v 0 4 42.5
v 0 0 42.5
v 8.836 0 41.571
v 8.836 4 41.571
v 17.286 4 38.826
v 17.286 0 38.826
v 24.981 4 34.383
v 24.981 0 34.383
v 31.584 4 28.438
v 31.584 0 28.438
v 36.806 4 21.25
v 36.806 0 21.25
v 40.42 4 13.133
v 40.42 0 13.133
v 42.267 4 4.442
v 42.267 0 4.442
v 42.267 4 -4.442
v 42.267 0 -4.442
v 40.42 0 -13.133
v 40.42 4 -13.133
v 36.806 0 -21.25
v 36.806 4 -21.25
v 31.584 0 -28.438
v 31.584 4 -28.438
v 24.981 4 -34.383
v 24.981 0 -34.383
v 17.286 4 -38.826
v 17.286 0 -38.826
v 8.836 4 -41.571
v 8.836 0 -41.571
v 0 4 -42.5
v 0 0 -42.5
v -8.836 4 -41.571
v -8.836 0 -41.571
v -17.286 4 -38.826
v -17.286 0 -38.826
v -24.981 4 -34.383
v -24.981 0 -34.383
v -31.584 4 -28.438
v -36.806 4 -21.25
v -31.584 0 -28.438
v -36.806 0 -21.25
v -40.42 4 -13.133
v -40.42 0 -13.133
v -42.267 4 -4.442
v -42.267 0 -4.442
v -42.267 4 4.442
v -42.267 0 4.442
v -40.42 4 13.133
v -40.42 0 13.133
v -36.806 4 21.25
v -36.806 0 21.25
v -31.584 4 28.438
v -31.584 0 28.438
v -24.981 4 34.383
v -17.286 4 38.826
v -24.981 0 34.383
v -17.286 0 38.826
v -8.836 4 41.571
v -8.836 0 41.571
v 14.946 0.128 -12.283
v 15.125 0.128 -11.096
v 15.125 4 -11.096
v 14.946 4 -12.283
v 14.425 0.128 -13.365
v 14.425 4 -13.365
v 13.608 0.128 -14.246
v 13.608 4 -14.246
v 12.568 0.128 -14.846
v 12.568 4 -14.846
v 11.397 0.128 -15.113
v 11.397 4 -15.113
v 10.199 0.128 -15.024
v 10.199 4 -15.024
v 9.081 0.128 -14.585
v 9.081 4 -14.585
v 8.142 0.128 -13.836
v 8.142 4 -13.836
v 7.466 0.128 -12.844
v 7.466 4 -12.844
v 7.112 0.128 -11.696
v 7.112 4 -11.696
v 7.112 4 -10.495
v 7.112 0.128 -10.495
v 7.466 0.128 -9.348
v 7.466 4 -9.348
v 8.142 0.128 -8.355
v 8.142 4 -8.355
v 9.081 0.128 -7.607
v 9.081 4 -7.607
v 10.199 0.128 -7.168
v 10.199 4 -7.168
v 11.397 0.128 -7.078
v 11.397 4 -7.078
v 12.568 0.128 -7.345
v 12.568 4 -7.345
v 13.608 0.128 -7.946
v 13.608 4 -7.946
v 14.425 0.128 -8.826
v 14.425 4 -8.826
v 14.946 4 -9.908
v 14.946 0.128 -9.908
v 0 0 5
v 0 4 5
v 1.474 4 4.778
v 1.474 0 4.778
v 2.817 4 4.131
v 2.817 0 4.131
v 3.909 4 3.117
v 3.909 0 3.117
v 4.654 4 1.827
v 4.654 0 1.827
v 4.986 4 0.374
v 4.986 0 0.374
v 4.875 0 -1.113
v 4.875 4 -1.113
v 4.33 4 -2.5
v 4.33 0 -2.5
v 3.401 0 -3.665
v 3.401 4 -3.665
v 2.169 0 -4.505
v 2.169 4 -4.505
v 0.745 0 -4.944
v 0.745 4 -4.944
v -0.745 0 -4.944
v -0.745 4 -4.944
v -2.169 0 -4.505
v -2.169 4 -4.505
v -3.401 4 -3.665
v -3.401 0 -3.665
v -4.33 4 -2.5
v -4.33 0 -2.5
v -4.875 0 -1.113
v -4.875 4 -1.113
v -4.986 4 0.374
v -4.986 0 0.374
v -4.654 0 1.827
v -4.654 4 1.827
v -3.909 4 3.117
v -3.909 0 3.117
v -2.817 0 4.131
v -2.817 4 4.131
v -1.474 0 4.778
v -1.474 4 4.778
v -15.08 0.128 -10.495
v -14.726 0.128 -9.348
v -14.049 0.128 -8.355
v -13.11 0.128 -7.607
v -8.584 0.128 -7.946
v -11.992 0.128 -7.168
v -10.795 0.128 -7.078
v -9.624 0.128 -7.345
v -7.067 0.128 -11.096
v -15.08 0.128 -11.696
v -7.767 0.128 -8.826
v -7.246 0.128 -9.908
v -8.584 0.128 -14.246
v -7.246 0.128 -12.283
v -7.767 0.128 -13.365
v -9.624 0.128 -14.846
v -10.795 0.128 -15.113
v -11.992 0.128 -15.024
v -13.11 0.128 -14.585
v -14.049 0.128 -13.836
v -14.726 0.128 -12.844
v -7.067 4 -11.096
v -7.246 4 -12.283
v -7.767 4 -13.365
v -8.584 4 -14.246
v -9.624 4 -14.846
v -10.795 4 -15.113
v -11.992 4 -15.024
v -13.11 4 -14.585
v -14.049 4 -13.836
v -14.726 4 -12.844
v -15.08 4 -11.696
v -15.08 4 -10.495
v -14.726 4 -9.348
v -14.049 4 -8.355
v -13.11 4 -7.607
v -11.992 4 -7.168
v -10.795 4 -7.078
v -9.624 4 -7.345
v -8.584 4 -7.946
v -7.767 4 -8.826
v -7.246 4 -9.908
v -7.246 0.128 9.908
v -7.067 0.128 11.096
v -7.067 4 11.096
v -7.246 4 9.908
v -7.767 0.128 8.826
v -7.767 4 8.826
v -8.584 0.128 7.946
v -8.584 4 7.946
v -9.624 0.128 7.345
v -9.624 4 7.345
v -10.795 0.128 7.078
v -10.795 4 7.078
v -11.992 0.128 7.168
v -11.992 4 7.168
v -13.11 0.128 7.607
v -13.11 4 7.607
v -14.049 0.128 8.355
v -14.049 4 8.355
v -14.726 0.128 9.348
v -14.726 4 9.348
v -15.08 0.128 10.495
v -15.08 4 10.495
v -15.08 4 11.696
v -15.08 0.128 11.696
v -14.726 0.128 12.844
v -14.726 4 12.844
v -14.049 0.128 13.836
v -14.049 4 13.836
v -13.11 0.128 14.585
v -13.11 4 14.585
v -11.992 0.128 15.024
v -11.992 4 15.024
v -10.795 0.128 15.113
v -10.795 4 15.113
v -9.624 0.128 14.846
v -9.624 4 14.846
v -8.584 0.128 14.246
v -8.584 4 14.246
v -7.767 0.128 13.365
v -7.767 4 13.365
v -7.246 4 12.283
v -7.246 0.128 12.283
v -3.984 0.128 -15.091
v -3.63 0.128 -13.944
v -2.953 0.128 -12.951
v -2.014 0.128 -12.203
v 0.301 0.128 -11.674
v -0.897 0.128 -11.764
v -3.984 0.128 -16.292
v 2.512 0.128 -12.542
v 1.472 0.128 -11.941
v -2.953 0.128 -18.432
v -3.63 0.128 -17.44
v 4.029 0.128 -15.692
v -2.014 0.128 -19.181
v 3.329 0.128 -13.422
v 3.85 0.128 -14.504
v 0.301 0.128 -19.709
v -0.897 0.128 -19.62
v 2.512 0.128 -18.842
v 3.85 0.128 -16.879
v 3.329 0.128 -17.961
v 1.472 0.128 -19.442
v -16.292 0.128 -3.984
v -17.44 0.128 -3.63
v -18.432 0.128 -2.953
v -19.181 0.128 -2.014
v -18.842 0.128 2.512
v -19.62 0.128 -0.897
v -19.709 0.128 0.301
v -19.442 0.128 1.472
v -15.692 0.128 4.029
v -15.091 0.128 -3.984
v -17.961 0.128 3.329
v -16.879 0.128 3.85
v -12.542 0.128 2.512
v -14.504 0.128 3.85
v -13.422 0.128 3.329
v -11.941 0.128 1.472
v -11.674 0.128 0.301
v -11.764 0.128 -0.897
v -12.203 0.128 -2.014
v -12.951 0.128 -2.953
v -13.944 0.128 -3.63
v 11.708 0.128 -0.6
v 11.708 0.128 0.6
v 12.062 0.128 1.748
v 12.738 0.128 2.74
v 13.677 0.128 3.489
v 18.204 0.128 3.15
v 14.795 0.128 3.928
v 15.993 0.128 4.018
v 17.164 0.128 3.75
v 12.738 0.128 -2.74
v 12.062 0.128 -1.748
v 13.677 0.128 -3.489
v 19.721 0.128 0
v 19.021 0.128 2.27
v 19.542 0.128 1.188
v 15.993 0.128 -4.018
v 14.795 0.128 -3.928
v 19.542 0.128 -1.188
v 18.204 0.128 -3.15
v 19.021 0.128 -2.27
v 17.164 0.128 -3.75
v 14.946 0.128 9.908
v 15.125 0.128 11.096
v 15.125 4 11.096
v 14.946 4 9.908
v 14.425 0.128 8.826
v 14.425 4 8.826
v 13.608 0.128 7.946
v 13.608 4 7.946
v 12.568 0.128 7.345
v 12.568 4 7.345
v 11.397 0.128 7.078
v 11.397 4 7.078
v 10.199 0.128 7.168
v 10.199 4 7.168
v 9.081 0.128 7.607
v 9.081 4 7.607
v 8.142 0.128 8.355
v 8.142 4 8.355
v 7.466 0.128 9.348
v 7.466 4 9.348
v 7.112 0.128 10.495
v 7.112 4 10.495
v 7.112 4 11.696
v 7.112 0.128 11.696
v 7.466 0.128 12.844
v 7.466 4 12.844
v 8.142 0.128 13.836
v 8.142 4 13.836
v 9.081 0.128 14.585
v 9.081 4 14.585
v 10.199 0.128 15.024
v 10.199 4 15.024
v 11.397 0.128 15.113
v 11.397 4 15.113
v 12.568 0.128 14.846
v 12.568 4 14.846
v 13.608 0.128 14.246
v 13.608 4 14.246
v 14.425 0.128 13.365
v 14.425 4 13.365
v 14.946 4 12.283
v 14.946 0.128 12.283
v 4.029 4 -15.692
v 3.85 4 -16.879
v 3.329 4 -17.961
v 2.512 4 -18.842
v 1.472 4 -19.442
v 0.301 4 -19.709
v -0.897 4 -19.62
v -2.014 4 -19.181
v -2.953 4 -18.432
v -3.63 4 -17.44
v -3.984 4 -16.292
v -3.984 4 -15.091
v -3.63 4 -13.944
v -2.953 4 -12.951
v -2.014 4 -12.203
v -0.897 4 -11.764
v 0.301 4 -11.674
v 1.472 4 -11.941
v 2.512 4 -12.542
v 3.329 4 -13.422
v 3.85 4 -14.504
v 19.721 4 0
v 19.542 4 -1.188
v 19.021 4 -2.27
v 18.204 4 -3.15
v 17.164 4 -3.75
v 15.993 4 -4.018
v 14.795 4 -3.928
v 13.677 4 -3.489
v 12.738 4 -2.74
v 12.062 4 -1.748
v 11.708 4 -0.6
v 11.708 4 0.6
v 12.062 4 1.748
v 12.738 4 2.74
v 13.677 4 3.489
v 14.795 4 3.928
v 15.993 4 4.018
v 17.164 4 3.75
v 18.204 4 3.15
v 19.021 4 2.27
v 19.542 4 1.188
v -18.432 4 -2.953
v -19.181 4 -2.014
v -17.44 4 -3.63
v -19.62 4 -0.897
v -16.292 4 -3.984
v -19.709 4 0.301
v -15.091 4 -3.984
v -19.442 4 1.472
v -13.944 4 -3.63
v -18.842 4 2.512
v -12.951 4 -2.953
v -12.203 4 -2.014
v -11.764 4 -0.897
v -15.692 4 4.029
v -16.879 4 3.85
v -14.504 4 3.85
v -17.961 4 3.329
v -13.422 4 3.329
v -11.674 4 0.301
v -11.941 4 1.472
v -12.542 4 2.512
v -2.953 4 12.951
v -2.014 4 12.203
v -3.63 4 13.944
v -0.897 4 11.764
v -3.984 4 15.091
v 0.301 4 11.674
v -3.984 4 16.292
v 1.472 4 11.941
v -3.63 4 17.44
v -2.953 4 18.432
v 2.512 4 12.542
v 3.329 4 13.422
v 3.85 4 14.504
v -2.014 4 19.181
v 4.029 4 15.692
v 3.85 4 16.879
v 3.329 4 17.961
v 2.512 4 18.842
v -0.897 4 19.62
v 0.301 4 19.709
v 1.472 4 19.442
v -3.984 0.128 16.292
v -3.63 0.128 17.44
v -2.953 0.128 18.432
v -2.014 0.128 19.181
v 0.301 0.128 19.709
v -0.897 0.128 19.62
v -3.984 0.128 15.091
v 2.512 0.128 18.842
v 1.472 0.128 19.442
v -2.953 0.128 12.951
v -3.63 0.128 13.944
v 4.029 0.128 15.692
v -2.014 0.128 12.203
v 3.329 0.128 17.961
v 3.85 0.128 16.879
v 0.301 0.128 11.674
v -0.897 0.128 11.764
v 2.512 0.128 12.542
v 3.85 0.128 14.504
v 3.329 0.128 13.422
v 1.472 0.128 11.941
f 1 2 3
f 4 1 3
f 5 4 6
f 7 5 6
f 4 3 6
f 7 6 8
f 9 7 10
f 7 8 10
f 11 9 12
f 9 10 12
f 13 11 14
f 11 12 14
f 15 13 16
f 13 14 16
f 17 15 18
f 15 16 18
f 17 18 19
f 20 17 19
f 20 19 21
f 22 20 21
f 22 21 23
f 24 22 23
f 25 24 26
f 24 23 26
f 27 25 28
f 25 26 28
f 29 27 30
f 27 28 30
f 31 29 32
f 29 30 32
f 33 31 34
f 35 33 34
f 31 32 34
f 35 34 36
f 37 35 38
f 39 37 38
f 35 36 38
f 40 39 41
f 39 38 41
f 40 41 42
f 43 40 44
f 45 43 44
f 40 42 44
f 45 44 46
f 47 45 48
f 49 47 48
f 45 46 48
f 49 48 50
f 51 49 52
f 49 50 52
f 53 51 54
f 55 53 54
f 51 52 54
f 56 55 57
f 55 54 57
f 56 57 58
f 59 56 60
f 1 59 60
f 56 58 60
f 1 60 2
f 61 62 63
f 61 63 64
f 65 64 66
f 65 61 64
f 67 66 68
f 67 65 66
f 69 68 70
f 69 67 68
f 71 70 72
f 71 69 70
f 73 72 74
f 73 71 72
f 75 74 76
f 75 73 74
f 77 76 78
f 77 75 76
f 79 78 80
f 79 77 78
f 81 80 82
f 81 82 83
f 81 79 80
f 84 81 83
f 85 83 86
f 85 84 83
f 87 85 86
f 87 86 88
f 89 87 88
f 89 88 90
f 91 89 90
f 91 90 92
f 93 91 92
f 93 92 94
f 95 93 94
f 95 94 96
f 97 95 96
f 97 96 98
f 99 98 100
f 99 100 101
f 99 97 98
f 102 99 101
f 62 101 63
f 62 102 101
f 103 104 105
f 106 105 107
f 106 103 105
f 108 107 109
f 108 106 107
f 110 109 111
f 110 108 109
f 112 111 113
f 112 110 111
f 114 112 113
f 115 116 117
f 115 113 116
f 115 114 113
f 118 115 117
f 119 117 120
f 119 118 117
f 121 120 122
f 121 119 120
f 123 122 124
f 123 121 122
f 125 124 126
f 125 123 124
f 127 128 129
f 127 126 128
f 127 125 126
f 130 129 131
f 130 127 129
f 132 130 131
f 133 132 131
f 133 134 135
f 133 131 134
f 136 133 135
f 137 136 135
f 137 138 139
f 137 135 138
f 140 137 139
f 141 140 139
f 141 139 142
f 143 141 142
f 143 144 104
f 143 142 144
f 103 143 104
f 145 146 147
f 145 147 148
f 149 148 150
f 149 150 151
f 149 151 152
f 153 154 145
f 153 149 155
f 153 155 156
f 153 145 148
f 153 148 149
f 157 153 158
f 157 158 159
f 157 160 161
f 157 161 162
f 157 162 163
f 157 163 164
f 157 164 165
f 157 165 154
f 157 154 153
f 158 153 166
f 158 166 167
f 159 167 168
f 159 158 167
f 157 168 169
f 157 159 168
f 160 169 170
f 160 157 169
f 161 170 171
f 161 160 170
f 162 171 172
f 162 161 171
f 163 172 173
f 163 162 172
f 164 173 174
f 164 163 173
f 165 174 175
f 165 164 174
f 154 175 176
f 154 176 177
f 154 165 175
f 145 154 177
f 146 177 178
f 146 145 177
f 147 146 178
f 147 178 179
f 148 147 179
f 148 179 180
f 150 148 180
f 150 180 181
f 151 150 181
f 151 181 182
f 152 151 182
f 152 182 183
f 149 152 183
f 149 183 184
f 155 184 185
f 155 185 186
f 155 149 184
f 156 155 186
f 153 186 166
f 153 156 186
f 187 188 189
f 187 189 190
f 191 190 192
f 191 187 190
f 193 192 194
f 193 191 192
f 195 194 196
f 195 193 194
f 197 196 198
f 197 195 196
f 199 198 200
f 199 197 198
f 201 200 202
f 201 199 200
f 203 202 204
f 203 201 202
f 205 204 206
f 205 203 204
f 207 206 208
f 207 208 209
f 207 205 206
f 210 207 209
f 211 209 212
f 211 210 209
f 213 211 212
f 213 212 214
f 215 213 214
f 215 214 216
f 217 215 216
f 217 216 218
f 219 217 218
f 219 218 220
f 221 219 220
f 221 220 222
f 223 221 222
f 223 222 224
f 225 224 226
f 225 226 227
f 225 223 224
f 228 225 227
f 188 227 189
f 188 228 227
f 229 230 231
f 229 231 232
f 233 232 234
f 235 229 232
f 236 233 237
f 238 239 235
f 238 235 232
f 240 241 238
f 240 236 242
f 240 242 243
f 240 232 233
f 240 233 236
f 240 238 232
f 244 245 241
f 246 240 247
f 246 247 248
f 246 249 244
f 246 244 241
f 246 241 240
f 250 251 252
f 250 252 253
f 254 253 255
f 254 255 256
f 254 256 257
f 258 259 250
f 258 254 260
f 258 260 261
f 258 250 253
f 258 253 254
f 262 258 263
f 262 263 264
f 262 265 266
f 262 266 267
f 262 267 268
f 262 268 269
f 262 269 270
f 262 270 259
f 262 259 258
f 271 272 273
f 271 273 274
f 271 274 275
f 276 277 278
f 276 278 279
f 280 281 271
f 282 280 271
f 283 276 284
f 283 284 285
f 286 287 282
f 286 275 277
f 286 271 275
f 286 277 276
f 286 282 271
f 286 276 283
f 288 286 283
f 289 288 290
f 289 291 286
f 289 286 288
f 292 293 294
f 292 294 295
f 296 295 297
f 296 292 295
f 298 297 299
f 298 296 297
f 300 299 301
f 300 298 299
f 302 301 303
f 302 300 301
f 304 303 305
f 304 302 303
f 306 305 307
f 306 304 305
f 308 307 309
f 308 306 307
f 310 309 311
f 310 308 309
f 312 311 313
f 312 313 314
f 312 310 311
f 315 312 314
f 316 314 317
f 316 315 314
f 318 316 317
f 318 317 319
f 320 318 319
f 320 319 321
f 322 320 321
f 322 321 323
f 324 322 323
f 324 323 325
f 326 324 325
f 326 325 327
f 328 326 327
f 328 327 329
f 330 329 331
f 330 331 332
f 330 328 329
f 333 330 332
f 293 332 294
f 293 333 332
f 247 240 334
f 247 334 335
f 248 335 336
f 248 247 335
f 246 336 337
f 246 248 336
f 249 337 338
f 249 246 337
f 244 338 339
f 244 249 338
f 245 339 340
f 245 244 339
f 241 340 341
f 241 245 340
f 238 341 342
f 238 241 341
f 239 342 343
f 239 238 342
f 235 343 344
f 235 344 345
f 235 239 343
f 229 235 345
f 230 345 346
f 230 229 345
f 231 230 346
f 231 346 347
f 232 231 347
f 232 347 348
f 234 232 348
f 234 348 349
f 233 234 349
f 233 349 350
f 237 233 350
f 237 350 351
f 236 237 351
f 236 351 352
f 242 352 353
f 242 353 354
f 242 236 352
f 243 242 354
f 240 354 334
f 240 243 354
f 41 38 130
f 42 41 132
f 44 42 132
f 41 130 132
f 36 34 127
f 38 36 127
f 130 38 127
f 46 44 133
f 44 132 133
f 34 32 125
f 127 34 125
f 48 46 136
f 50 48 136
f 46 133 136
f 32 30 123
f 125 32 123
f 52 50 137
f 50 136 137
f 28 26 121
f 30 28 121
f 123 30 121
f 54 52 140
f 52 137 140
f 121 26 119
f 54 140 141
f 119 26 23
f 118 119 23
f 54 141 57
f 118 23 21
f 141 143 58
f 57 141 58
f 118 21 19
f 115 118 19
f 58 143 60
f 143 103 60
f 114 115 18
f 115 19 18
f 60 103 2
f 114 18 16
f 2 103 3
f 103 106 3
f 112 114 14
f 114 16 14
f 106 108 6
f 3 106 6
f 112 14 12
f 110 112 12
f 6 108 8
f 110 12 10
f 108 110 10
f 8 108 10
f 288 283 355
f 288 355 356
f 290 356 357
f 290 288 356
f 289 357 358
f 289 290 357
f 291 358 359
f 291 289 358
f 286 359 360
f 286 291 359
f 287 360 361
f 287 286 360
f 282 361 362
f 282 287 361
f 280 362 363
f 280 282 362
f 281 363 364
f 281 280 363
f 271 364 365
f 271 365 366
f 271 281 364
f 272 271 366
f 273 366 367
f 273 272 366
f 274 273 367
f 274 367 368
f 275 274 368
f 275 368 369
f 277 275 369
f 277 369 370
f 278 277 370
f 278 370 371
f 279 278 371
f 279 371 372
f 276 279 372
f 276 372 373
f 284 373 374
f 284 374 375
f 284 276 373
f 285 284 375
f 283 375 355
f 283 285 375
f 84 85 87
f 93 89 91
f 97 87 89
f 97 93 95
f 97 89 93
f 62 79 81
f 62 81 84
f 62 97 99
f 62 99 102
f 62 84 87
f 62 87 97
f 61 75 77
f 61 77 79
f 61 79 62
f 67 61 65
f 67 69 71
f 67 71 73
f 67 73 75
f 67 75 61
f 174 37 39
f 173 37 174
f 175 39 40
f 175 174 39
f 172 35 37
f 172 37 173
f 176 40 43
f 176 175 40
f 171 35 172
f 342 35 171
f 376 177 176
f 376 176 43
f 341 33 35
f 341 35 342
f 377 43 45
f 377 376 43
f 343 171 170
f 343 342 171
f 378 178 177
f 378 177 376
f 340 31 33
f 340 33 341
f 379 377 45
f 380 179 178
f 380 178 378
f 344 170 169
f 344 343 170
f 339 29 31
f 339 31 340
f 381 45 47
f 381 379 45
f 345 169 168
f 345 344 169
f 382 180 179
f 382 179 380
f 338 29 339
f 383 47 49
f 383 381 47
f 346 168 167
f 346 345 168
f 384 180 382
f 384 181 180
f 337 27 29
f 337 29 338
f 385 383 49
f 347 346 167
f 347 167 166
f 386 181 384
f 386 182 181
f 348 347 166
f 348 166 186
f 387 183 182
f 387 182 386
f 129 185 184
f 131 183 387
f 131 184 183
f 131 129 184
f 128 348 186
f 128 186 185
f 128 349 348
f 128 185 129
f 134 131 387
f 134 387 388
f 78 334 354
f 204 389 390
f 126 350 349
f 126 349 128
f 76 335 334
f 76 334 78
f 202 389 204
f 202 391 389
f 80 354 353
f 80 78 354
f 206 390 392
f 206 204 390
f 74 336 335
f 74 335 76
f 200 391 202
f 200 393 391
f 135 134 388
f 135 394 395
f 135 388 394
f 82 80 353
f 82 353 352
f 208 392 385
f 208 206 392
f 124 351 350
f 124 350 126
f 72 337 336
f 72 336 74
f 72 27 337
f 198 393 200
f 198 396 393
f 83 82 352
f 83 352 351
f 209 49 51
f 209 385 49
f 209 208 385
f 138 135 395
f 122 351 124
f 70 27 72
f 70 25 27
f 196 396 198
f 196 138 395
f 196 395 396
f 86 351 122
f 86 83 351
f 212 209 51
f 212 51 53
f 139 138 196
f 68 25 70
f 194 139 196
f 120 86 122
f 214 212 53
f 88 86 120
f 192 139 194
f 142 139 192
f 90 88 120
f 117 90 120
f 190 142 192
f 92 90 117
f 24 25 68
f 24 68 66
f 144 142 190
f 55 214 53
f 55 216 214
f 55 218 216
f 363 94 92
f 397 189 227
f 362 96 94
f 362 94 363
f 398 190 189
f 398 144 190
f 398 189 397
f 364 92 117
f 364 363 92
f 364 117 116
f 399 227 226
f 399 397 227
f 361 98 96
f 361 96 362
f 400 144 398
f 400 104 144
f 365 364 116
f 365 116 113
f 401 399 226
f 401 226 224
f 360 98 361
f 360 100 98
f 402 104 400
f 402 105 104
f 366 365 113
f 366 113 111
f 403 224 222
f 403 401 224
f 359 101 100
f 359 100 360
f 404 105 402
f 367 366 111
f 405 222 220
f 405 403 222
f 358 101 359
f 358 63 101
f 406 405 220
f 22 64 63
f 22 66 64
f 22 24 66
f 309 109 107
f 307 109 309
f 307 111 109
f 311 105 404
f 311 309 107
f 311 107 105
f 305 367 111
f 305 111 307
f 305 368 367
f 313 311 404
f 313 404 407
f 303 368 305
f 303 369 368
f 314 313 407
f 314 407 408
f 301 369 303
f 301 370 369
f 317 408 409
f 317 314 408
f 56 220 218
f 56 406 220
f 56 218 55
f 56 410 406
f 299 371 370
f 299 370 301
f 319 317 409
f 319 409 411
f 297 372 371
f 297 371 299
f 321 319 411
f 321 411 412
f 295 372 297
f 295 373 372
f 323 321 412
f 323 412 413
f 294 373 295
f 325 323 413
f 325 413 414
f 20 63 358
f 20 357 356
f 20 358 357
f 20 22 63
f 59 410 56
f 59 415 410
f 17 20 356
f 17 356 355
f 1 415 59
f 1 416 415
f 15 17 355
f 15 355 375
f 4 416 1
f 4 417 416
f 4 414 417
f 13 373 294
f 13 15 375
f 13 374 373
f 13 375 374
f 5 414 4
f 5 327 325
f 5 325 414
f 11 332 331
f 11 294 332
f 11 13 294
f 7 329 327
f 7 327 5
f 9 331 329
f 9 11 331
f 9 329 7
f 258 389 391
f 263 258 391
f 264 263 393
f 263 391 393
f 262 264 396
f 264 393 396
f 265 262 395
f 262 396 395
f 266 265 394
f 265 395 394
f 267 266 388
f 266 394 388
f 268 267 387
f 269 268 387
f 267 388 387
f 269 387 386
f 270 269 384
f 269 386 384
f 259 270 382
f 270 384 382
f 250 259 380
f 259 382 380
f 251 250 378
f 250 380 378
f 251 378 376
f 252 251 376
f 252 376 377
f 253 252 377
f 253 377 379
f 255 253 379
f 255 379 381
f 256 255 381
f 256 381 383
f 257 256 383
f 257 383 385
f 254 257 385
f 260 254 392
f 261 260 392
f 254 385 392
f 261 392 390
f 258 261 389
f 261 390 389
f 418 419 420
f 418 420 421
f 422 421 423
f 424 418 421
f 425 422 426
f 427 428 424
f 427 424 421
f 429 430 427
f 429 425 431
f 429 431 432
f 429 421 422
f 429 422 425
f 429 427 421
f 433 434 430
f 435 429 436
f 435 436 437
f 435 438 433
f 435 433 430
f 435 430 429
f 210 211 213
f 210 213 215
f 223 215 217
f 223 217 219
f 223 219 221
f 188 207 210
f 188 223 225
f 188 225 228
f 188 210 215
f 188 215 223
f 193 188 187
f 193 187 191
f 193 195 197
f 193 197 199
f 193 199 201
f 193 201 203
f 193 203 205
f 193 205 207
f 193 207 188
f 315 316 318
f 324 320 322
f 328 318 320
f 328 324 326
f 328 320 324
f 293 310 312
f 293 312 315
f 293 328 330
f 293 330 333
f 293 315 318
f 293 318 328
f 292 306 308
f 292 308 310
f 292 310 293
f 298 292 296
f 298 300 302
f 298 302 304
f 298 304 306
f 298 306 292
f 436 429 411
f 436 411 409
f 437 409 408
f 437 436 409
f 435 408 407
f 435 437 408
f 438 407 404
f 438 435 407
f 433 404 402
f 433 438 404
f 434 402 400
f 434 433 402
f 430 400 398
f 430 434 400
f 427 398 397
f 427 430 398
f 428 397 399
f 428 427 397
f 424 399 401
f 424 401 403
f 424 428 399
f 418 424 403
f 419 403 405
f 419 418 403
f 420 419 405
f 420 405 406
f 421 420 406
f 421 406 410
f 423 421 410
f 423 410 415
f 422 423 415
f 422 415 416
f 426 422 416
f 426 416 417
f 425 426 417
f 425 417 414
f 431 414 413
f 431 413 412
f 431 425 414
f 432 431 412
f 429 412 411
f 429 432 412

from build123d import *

# Parameters (mm, degrees)
SKETCH1_R           = 42.5
BOSS_EXTRUDE1_DEPTH = 4
SKETCH2_R           = 5
CUT_EXTRUDE1_DEPTH  = 61.237031799
SKETCH3_R           = 4.028837432
CUT_EXTRUDE2_DEPTH  = 3.872214821
CIRPATTERN1_COUNT   = 8


with BuildPart() as part:
    # Sketch1 → Boss-Extrude1 (new body)
    with BuildSketch(Plane(origin=(0, 0, 0), x_dir=(1, 0, 0), z_dir=(0, 1, 0))):
        Circle(SKETCH1_R)
    extrude(amount=BOSS_EXTRUDE1_DEPTH)

    # Sketch2 → Cut-Extrude1 (cut, through all)
    with BuildSketch(Plane(origin=(0, 0, 0), x_dir=(1, 0, 0), z_dir=(0, 1, 0))):
        Circle(SKETCH2_R)
    extrude(amount=CUT_EXTRUDE1_DEPTH, mode=Mode.SUBTRACT)

    # Sketch3 → Cut-Extrude2 (cut)
    with BuildSketch(Plane(origin=(0, 4, 0), x_dir=(1, 0, 0), z_dir=(0, 1, 0))):
        with Locations((-15.691767503, 0)):
            Circle(SKETCH3_R)
    cut_extrude2 = extrude(amount=-CUT_EXTRUDE2_DEPTH, mode=Mode.SUBTRACT)

    # CirPattern1: Cut-Extrude2 ×8 about axis
    cirpattern1_axis = Axis((0, 0, 0), (0, 1, 0))
    for i in range(1, CIRPATTERN1_COUNT):
        add(cut_extrude2.rotate(cirpattern1_axis, i * 360 / CIRPATTERN1_COUNT), mode=Mode.SUBTRACT)


solid = part.part
